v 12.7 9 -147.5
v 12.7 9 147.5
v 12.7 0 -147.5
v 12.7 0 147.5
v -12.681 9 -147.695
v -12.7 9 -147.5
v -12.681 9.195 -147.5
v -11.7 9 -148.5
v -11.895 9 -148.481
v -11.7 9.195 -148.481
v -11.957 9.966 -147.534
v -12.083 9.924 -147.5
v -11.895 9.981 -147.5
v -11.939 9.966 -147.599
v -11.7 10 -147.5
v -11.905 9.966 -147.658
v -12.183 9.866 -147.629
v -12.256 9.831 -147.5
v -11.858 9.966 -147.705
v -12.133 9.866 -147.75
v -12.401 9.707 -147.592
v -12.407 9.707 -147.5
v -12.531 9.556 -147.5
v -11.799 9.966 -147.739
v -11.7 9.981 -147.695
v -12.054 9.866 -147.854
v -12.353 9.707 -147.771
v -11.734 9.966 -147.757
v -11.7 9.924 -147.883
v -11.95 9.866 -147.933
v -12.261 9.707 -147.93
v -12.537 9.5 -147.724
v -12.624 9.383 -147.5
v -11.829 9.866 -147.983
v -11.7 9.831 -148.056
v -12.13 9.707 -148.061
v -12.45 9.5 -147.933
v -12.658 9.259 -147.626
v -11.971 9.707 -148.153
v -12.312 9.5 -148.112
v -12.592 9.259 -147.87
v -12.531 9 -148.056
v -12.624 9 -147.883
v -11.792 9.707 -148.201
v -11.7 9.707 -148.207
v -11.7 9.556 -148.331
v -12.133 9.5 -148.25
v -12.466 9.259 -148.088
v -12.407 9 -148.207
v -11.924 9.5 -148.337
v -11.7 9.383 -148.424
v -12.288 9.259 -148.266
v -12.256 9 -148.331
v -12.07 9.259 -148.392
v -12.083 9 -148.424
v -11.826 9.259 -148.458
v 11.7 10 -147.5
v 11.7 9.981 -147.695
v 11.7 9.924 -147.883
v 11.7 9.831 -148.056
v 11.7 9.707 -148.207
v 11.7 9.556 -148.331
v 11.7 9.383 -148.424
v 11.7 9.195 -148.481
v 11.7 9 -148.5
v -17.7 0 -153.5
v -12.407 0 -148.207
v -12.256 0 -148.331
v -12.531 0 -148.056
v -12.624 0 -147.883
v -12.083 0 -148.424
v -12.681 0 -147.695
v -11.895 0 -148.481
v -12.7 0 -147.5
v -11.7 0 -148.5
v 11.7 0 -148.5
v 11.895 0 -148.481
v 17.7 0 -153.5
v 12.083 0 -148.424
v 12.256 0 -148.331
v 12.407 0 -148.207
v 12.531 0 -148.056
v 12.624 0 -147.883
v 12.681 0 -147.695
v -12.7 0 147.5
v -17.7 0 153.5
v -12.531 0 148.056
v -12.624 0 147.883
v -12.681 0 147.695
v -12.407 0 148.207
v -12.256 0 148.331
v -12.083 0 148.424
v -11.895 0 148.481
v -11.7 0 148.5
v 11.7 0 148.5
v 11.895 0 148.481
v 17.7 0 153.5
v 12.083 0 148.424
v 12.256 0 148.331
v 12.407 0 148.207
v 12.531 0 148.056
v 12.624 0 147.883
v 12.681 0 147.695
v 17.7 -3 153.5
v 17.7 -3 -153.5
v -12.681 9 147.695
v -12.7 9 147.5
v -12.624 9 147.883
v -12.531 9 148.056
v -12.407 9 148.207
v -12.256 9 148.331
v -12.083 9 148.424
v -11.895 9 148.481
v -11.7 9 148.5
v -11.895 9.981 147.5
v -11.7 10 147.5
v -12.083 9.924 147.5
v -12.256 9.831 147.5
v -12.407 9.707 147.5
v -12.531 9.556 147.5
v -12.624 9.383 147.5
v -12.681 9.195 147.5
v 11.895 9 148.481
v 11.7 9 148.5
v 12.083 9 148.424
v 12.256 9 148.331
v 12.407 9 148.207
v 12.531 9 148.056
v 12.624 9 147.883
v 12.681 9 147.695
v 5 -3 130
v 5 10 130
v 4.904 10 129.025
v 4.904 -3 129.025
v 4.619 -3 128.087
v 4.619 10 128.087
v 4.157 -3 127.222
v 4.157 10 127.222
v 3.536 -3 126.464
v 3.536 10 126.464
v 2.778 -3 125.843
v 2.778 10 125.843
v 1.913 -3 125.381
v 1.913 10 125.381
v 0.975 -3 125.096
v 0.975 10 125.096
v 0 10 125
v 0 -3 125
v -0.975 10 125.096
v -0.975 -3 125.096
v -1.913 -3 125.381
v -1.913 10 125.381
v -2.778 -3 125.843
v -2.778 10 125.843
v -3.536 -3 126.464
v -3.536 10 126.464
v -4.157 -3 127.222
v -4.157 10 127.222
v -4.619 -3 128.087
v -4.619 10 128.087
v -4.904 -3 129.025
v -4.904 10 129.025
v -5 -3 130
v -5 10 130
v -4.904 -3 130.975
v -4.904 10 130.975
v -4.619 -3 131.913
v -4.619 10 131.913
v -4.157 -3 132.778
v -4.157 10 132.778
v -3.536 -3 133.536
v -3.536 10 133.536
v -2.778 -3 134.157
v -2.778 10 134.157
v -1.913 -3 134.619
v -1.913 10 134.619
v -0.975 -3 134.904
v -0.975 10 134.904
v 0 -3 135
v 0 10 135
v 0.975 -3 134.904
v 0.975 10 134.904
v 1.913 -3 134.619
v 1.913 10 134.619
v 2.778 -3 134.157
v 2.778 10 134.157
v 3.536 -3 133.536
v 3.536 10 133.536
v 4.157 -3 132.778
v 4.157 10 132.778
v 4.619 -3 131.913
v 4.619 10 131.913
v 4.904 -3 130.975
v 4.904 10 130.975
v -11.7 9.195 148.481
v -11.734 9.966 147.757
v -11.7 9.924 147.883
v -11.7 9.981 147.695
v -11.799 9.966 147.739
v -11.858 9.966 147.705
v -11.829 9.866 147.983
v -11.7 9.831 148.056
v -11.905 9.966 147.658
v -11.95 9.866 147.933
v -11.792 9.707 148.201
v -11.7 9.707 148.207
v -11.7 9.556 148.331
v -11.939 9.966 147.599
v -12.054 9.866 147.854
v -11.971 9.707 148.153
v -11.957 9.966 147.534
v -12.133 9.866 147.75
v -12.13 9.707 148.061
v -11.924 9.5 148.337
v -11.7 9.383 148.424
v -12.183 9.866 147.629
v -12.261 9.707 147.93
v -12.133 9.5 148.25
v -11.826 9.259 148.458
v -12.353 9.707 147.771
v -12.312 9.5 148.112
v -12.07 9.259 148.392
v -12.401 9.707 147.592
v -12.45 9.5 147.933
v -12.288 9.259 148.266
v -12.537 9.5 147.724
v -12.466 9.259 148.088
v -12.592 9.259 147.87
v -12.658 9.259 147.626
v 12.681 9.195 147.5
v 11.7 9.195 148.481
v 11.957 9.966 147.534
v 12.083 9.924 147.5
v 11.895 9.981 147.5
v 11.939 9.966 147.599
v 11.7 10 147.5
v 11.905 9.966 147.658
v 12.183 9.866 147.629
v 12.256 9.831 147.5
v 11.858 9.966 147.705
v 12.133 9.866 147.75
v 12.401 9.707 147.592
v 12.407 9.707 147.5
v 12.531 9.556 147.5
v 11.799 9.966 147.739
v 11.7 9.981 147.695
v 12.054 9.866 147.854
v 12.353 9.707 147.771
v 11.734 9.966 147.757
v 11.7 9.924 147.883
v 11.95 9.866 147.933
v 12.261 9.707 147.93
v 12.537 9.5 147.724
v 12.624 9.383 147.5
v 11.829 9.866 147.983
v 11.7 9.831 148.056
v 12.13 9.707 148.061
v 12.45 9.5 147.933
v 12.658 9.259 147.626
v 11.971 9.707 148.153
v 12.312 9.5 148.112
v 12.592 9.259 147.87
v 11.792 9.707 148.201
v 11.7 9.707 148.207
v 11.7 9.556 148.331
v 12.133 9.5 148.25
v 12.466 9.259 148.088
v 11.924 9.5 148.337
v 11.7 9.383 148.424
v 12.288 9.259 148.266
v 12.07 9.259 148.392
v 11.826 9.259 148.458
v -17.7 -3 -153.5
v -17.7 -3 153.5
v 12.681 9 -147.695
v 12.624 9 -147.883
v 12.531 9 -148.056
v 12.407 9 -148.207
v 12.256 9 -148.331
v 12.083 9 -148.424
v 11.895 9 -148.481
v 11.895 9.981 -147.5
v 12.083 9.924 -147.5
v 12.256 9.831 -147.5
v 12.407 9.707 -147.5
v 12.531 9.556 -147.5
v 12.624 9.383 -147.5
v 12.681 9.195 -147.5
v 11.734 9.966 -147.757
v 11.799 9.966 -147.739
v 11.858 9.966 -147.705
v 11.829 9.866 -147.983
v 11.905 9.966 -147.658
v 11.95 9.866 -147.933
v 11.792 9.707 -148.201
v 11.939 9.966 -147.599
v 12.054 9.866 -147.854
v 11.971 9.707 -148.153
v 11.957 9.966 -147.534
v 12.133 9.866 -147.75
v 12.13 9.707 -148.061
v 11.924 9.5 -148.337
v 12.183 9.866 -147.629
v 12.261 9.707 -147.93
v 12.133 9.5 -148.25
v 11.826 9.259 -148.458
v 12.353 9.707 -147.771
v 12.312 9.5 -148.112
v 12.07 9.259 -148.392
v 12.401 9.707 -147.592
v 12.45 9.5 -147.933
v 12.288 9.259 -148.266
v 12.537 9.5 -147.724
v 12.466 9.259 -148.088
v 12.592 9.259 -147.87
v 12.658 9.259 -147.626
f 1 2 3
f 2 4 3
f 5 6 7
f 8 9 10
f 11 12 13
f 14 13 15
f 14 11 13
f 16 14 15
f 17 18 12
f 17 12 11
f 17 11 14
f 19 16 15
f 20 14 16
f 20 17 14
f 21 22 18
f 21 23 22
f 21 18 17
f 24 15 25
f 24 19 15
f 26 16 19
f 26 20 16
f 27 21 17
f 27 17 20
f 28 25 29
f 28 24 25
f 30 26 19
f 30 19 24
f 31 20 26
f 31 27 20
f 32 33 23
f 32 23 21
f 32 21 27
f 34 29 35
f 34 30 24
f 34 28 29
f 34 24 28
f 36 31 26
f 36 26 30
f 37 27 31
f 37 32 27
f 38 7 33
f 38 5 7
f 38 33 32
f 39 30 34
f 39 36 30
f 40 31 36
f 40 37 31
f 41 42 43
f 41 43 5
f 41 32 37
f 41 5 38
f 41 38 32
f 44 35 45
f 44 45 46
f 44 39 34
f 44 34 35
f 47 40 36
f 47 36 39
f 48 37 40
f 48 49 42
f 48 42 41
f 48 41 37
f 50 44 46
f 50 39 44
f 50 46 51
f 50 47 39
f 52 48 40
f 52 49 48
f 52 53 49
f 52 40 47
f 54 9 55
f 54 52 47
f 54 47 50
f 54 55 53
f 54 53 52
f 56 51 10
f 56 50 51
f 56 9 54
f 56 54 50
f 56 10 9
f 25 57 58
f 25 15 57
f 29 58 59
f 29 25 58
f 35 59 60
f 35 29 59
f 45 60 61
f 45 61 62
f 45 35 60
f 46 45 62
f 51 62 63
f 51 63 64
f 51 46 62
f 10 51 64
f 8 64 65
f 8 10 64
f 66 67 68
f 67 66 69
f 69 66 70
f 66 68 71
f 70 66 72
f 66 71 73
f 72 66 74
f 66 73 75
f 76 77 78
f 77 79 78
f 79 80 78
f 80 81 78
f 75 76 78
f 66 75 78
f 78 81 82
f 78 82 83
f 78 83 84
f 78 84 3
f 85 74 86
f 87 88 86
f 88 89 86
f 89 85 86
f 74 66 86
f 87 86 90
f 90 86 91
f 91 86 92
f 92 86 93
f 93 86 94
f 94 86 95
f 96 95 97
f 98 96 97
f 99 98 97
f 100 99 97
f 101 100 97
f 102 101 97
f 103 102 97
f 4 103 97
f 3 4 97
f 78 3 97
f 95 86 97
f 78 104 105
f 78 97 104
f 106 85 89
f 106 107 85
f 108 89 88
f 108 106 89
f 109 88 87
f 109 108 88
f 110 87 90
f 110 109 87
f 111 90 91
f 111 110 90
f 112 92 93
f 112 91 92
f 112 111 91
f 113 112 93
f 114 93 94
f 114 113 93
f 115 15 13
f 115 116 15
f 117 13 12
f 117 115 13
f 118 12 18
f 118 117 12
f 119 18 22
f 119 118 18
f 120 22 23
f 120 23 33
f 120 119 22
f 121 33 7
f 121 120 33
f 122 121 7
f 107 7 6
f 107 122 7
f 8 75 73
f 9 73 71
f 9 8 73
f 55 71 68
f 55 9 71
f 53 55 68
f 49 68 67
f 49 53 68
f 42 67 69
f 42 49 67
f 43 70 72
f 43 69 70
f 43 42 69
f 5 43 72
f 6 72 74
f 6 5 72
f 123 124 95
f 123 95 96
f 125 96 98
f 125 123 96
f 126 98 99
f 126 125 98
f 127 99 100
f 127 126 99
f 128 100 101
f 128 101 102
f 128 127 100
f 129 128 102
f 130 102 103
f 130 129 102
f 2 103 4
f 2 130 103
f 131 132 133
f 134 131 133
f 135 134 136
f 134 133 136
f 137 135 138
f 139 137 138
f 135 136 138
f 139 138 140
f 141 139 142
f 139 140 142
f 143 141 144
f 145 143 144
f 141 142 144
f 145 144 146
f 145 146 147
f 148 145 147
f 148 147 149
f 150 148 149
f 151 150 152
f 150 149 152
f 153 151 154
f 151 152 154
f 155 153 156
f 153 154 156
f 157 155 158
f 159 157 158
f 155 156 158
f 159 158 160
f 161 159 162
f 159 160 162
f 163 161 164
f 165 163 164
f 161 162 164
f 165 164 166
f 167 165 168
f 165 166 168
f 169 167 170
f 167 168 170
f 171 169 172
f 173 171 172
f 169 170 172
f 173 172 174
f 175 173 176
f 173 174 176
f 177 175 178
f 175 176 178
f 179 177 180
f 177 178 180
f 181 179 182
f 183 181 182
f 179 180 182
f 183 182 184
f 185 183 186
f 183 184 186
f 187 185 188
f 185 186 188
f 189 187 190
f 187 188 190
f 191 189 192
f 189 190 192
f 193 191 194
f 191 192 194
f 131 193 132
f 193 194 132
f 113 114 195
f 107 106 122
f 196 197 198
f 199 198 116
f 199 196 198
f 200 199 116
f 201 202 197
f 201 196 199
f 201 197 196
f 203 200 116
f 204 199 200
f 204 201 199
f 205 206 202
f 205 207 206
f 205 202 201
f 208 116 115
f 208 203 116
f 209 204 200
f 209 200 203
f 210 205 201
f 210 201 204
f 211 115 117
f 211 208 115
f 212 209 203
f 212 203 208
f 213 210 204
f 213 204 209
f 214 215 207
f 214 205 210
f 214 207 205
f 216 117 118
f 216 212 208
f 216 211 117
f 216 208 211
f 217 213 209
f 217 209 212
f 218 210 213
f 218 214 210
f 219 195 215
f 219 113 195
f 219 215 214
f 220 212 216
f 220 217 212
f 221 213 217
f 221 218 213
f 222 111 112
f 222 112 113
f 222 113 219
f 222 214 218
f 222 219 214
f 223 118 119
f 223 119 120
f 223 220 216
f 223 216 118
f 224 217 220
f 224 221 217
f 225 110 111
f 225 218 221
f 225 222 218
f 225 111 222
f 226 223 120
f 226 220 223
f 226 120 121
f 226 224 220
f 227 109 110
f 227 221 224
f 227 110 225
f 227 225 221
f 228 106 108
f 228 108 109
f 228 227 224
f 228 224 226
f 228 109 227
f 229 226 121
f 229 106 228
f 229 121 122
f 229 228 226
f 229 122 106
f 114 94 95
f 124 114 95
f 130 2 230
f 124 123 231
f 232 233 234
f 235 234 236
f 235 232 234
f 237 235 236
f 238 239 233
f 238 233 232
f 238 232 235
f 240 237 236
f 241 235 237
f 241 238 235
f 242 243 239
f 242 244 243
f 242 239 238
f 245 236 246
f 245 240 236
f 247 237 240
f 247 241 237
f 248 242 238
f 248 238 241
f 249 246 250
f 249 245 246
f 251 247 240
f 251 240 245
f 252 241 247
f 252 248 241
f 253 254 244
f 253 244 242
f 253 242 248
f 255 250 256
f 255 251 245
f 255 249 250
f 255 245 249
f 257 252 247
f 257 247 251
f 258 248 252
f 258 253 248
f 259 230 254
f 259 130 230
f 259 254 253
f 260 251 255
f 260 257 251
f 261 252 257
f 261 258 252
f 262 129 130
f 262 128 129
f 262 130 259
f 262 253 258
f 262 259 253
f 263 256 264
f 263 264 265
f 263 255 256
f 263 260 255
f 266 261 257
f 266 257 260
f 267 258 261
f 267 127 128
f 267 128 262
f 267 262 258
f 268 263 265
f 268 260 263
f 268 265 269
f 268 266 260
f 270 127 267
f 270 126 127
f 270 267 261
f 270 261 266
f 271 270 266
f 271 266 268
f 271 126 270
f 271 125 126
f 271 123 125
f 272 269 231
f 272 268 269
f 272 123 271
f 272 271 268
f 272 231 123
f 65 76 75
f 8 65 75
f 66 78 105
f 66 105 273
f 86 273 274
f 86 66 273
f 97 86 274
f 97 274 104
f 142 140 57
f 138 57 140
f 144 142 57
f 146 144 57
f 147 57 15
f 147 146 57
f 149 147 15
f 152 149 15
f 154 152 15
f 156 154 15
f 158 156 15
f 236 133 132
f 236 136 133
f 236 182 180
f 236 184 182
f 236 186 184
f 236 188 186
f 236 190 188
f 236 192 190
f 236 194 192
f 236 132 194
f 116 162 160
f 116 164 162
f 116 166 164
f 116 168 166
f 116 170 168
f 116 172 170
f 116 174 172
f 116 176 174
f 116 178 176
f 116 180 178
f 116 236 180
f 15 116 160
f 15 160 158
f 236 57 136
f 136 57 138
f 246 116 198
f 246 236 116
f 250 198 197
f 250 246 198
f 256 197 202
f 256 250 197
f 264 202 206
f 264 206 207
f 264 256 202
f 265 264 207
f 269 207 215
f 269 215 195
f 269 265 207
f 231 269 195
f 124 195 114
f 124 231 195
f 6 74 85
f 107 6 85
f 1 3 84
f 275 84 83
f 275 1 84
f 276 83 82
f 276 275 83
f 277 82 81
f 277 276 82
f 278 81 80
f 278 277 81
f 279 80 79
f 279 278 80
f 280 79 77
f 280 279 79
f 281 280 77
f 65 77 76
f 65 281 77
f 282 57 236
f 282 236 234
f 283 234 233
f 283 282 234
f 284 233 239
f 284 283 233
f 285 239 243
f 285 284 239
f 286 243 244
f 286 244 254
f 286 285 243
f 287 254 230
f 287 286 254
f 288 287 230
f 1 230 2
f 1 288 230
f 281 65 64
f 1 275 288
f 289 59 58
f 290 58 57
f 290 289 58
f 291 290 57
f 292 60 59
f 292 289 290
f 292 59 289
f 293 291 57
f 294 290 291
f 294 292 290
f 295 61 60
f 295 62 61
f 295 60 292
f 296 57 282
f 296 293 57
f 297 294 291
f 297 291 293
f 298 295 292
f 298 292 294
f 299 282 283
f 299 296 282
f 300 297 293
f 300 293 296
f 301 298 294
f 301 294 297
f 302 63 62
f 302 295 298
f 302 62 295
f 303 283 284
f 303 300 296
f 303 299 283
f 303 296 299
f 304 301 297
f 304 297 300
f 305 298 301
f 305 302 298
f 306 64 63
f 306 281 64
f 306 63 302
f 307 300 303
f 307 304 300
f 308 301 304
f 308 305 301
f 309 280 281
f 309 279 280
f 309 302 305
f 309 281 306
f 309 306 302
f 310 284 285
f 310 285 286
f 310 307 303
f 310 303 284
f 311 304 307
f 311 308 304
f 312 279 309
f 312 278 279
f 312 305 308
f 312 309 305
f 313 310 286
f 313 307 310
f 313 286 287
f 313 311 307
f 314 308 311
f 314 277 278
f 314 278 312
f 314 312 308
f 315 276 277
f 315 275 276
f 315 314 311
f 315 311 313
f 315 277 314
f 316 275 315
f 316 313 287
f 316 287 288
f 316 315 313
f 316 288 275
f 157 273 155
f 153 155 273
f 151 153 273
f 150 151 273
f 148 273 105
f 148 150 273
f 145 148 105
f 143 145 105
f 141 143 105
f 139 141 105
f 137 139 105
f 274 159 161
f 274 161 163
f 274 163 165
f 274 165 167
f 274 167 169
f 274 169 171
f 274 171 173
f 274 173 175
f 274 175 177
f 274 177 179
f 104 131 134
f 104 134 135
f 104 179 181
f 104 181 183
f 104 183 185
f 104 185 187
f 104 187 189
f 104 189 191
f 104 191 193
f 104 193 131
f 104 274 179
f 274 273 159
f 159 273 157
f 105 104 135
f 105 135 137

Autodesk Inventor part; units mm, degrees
ref_plane "YZ Plane" through (0, 0, 0) normal (1, 0, 0) x (0, 1, 0)
ref_plane "XZ Plane" through (0, 0, 0) normal (0, 1, 0) x (-1, 0, 0)
ref_plane "XY Plane" through (0, 0, 0) normal (0, 0, 1) x (1, 0, 0)
sketch "Sketch1" plane through (0, 0, 0) normal (0, 1, 0) x (-1, 0, 0)
  line L0 (-12.7, -148.5) -> (12.7, -148.5)
  line L1 (12.7, -148.5) -> (12.7, 148.5)
  line L2 (12.7, 148.5) -> (-12.7, 148.5)
  line L3 (-12.7, 148.5) -> (-12.7, -148.5)
  line L4 (-12.7, -148.5) -> (12.7, 148.5) construction
  line L5 (12.7, -148.5) -> (-12.7, 148.5) construction
  point P0 (0, 0)
  dimension "d0" = 25.4
  dimension "d1" = 297
extrude "Extrusion1" add sketch "Sketch1" along normal blind 10
sketch "Sketch2" plane through (0, 0, 0) normal (0, -1, 0) x (1, 0, 0)
  line L0 (12.7, -148.5) -> (-12.7, -148.5) projected
  line L1 (12.7, 148.5) -> (12.7, -148.5) projected
  line L2 (-12.7, 148.5) -> (12.7, 148.5) projected
  line L3 (-12.7, -148.5) -> (-12.7, 148.5) projected
  line L4 (17.7, -153.5) -> (-17.7, -153.5)
  line L5 (-17.7, -153.5) -> (-17.7, 153.5)
  line L6 (-17.7, 153.5) -> (17.7, 153.5)
  line L7 (17.7, 153.5) -> (17.7, -153.5)
  point P0 (0, 0)
  dimension "d4" = 5
extrude "Extrusion2" add sketch "Sketch2" along normal blind 3 contours L0 L3 L2 L1 | L4 L5 L6 L7
sketch "Sketch3" plane through (0, 10, 0) normal (0, 1, 0) x (1, 0, 0)
  line L0 (12.7, 148.5) -> (-12.7, 148.5) projected
  line L1 (-12.7, 148.5) -> (-12.7, -148.5) projected
  line L2 (-12.7, -148.5) -> (12.7, -148.5) projected
  line L3 (12.7, -148.5) -> (12.7, 148.5) projected
  circle A0 centre (0, -130) radius 5
  point P0 (0, 0)
  dimension "d7" = 10
  dimension "d8" = 130
extrude "Extrusion3" cut sketch "Sketch3" against normal through all contours A0
fillet "Fillet1" radius 1 8 edges at (12.7, 5, 148.5) (-12.7, 5, 148.5) (12.7, 5, -148.5) (-12.7, 5, -148.5) (0, 10, -148.5) (-12.7, 10, 0) (12.7, 10, 0) (0, 10, 148.5)
properties part number "enclosureTop"
